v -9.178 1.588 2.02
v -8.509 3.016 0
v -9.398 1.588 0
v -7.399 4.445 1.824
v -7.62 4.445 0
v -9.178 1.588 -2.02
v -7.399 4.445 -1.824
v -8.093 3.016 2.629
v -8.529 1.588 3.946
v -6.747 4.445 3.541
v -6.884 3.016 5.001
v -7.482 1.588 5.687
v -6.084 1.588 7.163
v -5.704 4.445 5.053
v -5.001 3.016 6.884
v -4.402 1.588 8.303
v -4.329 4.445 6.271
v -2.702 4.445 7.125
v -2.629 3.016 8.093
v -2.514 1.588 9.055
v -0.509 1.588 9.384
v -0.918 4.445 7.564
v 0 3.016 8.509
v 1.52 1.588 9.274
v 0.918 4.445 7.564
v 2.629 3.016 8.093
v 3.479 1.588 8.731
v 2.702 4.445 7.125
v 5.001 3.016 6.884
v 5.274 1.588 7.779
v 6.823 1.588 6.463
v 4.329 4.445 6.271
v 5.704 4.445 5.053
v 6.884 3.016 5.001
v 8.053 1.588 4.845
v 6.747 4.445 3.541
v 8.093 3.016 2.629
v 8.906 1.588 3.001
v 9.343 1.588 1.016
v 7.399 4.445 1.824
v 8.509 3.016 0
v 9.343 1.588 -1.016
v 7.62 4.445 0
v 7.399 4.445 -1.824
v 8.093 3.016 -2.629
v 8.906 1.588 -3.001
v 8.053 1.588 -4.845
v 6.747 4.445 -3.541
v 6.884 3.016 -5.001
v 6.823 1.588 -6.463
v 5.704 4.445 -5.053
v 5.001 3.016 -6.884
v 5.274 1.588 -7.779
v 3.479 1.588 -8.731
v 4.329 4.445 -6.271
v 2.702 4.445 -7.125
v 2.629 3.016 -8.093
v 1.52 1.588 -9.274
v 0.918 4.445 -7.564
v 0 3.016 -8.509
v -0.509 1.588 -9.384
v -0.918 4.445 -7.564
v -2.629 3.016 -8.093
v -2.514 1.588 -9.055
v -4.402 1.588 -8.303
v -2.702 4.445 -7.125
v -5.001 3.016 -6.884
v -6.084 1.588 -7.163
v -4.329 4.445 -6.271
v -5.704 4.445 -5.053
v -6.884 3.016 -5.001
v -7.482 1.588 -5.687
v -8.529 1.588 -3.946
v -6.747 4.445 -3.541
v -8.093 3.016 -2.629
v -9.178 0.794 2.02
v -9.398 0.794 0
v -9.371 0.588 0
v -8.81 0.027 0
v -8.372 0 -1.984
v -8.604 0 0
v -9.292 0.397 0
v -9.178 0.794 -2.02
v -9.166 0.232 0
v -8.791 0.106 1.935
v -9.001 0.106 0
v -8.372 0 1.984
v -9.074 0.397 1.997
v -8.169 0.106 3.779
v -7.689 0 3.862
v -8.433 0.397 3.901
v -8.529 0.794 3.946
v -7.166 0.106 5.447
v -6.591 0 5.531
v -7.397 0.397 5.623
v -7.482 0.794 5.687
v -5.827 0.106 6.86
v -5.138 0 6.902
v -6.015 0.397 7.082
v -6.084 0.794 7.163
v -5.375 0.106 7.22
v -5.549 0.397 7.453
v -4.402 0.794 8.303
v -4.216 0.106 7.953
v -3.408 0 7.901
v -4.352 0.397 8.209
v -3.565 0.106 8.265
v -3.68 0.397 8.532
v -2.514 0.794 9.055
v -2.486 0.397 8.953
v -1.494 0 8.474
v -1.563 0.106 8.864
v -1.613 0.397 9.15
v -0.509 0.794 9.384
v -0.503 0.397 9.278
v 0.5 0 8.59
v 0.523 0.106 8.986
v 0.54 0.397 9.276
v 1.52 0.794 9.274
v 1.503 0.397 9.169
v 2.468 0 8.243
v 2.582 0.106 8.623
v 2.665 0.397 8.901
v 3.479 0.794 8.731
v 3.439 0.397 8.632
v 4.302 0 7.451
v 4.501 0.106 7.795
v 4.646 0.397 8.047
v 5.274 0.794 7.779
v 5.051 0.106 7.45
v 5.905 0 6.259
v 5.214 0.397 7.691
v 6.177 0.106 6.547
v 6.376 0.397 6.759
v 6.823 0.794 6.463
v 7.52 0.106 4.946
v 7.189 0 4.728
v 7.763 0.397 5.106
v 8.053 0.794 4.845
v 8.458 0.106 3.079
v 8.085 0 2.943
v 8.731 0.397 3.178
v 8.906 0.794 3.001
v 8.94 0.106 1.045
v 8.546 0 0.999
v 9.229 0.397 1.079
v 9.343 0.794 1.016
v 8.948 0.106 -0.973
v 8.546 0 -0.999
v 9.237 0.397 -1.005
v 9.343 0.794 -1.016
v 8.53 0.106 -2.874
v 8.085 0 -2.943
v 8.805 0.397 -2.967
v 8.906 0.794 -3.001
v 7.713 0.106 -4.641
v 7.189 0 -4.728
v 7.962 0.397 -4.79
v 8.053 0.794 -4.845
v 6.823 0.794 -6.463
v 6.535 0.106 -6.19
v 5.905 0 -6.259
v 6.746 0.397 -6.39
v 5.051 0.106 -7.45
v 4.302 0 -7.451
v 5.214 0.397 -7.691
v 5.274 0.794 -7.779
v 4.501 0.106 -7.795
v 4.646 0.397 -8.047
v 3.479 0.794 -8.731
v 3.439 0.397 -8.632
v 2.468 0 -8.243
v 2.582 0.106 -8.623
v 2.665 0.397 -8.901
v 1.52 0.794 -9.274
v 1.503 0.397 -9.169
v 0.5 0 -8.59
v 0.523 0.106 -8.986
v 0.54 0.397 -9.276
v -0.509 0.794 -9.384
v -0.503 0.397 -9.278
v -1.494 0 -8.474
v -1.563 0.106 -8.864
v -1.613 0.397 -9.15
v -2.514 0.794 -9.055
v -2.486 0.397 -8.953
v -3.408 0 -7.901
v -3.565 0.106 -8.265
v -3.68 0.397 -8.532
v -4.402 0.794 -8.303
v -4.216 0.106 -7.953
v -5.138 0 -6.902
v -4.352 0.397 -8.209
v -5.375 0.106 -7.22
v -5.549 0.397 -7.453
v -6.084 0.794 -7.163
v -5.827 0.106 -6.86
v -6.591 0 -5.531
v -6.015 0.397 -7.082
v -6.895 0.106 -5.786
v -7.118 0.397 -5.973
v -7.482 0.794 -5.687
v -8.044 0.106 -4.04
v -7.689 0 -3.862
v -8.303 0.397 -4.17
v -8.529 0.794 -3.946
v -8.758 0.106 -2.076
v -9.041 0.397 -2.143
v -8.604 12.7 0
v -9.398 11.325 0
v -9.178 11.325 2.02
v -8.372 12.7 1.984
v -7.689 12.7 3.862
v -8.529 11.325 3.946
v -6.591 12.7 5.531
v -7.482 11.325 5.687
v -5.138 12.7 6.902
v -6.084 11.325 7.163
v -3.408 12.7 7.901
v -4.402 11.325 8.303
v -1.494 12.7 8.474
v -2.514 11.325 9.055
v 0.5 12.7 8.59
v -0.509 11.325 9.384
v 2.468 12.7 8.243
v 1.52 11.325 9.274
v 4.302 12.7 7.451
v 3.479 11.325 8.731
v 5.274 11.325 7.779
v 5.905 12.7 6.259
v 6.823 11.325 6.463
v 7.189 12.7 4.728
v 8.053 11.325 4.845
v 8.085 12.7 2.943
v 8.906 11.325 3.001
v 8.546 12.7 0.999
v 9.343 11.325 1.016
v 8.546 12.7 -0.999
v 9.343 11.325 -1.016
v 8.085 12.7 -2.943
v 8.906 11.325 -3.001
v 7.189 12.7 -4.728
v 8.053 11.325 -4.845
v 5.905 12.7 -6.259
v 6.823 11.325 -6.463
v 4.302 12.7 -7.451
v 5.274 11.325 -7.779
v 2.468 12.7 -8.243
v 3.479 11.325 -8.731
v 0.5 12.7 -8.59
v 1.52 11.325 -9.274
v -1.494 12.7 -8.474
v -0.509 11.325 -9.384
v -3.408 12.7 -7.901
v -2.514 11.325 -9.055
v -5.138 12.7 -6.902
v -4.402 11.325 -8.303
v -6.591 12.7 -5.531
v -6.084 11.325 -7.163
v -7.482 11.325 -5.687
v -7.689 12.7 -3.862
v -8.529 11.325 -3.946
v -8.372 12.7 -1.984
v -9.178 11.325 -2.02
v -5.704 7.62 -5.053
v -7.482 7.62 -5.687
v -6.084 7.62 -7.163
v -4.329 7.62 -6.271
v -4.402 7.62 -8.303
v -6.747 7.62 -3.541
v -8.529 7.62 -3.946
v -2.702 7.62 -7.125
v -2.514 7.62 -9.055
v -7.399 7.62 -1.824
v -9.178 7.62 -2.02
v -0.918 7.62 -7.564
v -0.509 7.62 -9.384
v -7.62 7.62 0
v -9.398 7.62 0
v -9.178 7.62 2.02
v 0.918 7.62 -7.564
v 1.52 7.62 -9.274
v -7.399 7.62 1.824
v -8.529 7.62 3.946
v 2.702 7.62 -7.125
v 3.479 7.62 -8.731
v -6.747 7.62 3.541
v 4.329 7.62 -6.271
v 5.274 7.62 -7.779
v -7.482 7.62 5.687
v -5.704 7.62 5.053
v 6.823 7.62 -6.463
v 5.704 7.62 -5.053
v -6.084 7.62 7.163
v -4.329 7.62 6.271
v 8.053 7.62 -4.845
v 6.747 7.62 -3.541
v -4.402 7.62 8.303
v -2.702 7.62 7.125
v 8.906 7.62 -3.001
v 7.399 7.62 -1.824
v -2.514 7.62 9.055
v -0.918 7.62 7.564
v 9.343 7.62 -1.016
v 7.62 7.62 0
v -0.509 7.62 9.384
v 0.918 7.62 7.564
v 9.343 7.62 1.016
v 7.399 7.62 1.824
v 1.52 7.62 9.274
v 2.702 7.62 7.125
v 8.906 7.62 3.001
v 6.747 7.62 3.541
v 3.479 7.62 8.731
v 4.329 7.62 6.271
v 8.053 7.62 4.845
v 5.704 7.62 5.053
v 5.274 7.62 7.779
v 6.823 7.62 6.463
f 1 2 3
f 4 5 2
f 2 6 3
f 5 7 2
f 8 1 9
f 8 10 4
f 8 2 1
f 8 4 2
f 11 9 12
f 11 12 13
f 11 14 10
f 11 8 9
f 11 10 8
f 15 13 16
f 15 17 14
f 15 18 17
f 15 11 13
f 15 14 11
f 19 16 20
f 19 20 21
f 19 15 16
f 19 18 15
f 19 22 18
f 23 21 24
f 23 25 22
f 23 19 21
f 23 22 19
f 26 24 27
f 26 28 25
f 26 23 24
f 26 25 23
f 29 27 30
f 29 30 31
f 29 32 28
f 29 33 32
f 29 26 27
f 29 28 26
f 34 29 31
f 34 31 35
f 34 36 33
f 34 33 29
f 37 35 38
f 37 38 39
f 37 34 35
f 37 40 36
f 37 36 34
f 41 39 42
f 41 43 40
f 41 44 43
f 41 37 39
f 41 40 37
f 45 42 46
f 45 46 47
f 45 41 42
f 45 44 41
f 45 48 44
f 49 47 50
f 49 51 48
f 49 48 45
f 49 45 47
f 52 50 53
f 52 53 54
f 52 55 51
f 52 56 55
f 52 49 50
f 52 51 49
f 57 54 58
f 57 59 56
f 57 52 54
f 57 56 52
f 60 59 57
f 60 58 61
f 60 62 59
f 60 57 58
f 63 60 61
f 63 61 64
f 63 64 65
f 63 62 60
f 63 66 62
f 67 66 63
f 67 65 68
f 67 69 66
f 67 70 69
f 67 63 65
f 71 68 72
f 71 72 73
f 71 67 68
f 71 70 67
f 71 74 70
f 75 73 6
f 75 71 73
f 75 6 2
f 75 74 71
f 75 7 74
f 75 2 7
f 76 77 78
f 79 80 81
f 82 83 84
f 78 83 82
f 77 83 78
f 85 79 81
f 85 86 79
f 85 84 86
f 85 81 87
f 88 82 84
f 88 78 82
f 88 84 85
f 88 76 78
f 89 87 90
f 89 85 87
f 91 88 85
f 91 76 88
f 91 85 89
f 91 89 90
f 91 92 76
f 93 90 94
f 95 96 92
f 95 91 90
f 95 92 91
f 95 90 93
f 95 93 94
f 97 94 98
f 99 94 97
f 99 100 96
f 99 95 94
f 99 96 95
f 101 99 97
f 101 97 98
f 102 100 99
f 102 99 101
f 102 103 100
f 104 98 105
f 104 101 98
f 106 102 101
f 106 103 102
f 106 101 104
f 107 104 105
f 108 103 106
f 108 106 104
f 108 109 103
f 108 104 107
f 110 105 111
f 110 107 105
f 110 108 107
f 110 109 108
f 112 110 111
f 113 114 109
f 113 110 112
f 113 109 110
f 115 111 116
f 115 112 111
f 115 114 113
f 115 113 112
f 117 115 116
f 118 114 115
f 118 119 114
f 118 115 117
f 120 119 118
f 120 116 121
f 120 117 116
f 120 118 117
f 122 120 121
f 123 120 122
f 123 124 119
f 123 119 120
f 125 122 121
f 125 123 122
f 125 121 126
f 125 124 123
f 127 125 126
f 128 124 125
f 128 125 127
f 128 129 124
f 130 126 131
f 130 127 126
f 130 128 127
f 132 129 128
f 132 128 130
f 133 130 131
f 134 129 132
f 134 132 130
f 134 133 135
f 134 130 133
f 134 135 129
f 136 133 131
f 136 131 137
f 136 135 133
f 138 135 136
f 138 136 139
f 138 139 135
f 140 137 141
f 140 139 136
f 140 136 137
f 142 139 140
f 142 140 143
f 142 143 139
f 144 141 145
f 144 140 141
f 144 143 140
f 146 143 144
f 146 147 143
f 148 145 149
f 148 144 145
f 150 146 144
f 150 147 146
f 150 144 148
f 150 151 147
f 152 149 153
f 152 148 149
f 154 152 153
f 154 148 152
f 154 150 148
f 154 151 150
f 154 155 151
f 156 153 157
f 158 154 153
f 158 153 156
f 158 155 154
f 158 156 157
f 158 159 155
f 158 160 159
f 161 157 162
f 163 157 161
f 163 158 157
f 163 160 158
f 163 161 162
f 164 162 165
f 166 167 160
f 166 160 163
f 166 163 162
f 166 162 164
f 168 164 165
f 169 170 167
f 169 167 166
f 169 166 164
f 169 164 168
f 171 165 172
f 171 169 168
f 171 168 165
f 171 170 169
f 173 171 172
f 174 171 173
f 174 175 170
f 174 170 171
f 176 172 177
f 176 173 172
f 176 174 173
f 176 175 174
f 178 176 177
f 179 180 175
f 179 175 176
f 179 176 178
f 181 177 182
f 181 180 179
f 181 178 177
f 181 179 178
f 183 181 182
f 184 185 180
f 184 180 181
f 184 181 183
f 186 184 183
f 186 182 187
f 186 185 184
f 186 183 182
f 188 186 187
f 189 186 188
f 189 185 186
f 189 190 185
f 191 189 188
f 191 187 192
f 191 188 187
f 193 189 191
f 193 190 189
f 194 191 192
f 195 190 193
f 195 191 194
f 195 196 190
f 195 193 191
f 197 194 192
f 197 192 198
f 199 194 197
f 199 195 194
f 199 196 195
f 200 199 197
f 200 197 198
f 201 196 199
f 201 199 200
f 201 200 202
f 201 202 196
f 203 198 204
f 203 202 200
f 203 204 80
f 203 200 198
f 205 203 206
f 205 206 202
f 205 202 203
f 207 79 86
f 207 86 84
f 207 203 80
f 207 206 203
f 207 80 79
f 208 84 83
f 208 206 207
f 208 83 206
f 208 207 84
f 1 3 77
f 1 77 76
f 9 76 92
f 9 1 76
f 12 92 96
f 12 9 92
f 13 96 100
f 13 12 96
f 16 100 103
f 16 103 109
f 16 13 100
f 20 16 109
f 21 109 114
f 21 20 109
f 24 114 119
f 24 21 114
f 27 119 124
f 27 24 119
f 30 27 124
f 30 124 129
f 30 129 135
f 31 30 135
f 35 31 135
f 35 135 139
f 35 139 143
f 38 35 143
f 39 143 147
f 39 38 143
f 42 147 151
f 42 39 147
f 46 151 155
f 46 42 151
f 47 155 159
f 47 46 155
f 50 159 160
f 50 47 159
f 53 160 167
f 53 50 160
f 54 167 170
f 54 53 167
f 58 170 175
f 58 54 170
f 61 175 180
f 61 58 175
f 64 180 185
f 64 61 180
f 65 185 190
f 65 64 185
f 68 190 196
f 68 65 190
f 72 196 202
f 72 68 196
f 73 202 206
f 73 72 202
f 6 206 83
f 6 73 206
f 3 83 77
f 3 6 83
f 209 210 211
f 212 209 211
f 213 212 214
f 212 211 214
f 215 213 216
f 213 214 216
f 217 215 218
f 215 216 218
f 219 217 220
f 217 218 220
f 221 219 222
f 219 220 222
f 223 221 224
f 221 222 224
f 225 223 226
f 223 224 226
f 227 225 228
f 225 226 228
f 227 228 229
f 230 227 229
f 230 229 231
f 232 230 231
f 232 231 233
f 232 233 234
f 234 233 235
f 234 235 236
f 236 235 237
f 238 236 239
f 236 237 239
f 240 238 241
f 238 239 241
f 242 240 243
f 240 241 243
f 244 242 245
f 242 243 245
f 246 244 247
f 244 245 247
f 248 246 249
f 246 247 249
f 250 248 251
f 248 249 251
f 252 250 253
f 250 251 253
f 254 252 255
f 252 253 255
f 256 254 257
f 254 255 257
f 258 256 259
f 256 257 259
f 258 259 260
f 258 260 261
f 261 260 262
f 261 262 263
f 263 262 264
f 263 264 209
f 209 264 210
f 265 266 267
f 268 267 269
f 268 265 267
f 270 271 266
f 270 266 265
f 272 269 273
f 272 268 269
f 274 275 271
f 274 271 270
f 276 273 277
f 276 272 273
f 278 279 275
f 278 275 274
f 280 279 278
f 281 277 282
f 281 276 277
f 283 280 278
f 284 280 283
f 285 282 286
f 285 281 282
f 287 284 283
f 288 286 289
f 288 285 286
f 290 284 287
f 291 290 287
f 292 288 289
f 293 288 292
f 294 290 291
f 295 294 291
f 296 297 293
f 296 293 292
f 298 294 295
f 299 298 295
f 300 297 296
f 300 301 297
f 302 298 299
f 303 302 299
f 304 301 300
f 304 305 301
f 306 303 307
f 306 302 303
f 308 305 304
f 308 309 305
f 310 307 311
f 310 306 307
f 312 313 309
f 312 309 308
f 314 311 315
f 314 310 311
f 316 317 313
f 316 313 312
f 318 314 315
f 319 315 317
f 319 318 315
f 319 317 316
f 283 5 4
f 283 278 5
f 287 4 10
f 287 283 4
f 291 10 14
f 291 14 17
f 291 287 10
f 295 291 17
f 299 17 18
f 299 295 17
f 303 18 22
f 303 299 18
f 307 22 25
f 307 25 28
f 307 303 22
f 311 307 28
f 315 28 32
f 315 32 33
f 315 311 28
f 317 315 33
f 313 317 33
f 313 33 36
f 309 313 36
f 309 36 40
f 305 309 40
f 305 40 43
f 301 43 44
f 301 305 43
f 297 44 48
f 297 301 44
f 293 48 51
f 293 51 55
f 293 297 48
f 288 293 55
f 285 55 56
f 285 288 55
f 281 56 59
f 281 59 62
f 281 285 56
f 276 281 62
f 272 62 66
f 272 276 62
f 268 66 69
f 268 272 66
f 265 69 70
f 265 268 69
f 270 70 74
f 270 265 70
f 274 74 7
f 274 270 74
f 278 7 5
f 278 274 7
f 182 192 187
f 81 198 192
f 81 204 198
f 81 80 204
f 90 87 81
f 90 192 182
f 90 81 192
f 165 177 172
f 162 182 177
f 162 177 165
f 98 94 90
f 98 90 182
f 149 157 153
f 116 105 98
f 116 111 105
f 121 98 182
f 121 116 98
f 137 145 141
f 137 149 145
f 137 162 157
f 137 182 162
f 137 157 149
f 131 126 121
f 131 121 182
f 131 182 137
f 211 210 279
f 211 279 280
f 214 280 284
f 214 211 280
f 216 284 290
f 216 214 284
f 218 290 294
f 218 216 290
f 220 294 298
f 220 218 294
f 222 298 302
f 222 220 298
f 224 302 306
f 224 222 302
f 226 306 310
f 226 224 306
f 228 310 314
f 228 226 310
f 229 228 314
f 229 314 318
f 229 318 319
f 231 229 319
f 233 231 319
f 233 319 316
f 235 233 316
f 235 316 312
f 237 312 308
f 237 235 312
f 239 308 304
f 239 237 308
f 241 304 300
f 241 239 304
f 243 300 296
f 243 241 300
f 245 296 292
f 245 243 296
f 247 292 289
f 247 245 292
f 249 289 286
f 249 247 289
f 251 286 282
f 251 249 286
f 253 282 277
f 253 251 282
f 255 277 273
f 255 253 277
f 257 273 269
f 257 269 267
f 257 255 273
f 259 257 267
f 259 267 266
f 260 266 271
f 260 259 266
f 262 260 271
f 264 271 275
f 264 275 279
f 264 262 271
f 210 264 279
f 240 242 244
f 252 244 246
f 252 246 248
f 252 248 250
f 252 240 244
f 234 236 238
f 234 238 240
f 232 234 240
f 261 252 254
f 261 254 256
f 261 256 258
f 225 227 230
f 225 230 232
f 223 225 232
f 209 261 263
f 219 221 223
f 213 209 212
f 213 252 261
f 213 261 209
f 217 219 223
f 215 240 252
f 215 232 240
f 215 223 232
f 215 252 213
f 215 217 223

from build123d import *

# Parameters (mm, degrees)
FILLET1_R      = 0.79375
CHAMFER1_SIZE  = 0.79375
CHAMFER1_SIZE2 = 1.374815329


with BuildPart() as part:
    # Sketch1 → Revolve1 (revolve)
    with BuildSketch(Plane.XY):
        Polygon((0, 0), (-9.398, 0), (-9.398, 1.5875), (-7.62, 4.445), (-7.62, 7.62), (-9.398, 7.62), (-9.398, 12.7), (0, 12.7), align=None)
    revolve(axis=Axis((0, 0, 0), (0, 1, 0)))

    # Fillet1
    fillet1_edges = [part.edges().sort_by_distance(p)[0] for p in [
        (9.398, 0, 0),
    ]]
    fillet(fillet1_edges, radius=FILLET1_R)

    # Chamfer1
    chamfer1_edges = [part.edges().sort_by_distance(p)[0] for p in [
        (9.398, 12.7, 0),
    ]]
    chamfer1_side = [part.faces().sort_by_distance(p)[0] for p in [
        (0, 12.7, 0),
    ]]
    chamfer(chamfer1_edges, length=CHAMFER1_SIZE, length2=CHAMFER1_SIZE2, reference=chamfer1_side[0])


solid = part.part
